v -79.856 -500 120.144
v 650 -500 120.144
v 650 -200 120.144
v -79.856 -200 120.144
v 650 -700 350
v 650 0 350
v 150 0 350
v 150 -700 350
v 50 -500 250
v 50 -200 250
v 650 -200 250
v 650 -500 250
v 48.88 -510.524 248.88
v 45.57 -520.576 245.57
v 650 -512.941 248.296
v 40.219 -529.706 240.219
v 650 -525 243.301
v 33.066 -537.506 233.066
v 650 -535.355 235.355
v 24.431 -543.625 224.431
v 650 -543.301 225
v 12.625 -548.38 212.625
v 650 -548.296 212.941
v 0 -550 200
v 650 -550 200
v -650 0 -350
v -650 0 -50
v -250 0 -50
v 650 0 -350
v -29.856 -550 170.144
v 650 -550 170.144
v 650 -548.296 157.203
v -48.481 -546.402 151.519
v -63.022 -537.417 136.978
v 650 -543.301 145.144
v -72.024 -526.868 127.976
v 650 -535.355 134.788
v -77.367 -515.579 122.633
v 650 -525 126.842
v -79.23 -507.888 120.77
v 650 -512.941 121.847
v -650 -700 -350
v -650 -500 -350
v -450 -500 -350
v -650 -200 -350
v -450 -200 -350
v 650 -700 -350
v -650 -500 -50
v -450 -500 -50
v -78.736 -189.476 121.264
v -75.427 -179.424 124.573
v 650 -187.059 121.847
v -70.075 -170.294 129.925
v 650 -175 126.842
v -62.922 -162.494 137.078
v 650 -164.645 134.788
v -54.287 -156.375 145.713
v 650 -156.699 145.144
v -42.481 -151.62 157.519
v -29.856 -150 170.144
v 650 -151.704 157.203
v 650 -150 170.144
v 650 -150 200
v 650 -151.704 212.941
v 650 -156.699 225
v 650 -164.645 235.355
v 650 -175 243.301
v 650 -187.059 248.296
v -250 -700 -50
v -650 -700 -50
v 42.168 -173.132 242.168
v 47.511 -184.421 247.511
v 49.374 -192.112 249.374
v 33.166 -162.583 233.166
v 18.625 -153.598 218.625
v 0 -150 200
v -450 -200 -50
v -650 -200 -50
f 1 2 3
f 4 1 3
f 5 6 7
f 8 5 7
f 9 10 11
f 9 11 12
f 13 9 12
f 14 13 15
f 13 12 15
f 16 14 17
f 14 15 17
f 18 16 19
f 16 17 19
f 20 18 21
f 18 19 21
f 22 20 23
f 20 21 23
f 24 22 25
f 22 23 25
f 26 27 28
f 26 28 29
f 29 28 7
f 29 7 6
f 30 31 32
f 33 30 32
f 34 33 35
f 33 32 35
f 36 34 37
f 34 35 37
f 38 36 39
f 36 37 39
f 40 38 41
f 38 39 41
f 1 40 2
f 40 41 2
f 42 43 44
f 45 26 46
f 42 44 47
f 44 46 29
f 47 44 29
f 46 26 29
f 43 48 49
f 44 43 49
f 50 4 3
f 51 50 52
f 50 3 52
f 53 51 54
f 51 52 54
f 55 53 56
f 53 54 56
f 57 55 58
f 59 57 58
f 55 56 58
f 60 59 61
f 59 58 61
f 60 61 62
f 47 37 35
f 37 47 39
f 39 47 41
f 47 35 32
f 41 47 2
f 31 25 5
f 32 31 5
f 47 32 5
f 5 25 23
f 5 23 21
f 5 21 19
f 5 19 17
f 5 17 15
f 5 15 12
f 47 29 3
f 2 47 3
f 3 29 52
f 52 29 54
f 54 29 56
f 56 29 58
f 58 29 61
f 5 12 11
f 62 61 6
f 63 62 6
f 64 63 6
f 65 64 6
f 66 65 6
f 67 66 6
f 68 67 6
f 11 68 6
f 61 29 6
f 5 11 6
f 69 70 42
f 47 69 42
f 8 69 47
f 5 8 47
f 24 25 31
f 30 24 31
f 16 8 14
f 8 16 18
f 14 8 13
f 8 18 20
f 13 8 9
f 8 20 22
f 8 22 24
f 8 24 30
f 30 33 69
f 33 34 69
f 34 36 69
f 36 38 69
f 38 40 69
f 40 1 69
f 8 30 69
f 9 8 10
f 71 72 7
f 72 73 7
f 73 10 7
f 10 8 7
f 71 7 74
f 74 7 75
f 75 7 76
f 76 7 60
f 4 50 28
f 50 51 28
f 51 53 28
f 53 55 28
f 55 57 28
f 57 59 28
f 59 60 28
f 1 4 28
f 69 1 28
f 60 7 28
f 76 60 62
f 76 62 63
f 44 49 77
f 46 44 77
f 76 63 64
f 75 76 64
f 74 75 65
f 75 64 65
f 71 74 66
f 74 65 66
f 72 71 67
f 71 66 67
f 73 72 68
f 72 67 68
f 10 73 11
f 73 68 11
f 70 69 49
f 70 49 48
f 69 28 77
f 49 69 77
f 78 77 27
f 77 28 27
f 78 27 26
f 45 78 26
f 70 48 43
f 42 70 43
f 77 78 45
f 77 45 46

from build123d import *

# Parameters (mm, degrees)
F1_DEPTH = 700
F3_DEPTH = 1300.001
F4_W     = 200
F4_H     = 300
F5_DEPTH = 300.001


with BuildPart() as f1:
    # F0 (on Front) → F1 (new body)
    with BuildSketch(Plane.XZ):
        Polygon((650, -350), (650, 350), (150, 350), (-250, -50), (-650, -50), (-650, -350), align=None)
    extrude(amount=F1_DEPTH)

    # F2 (on face) → F3 (cut, through all)
    with BuildSketch(Plane.YZ.offset(650)):
        with BuildLine():
            ThreePointArc((-550, 170.143622), (-535.355339, 134.788283), (-500, 120.143622))
            Line((-500, 120.143622), (-200, 120.143622))
            ThreePointArc((-200, 120.143622), (-164.644661, 134.788283), (-150, 170.143622))
            Line((-150, 170.143622), (-150, 200))
            ThreePointArc((-150, 200), (-164.644661, 235.355339), (-200, 250))
            Line((-200, 250), (-500, 250))
            ThreePointArc((-500, 250), (-535.355339, 235.355339), (-550, 200))
            Line((-550, 200), (-550, 170.143622))
        make_face()
    extrude(amount=-F3_DEPTH, mode=Mode.SUBTRACT)

    # F4 (on face) → F5 (cut, through all)
    with BuildSketch(Plane.XY.offset(-50)):
        with Locations((-550, -350)):
            Rectangle(F4_W, F4_H)
    extrude(amount=-F5_DEPTH, mode=Mode.SUBTRACT)


solid = f1.part
